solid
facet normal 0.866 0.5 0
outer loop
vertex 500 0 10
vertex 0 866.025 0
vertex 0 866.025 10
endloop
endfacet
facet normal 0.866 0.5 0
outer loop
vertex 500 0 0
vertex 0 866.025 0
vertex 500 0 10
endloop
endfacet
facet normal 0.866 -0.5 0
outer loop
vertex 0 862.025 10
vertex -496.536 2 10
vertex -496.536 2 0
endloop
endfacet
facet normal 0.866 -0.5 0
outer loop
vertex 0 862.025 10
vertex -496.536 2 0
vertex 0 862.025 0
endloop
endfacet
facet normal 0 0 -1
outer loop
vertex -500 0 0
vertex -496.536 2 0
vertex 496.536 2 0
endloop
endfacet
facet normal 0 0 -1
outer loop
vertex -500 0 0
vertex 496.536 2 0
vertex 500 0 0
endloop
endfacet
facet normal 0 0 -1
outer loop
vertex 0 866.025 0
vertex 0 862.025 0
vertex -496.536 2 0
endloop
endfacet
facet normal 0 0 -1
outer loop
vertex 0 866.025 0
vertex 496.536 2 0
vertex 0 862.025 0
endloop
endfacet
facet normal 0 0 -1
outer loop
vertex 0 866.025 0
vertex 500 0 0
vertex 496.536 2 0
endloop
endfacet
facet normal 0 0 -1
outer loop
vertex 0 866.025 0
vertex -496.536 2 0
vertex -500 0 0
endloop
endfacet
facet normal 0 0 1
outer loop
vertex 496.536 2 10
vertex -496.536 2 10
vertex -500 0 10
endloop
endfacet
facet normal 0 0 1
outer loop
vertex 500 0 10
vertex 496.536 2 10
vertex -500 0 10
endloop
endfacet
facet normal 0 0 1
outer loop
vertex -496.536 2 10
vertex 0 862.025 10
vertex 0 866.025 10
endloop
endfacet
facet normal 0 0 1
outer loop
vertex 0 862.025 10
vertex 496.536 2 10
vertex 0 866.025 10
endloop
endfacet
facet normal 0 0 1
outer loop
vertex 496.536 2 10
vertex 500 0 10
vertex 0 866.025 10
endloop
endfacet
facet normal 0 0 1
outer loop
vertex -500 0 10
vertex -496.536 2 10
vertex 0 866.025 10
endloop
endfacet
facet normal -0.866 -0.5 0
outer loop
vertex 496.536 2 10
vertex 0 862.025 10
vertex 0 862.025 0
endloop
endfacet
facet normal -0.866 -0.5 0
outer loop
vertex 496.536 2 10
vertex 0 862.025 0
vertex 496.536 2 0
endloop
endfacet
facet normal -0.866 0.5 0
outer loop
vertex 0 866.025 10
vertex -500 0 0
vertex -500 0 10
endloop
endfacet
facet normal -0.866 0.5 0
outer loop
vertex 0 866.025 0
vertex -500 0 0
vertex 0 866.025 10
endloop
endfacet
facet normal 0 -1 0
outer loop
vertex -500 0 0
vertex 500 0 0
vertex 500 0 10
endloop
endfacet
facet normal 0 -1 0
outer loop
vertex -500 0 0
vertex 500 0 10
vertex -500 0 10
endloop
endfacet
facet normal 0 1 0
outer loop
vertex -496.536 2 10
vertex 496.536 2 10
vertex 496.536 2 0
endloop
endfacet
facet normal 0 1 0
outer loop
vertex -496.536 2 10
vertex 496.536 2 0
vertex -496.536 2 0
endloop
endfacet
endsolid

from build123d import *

# Parameters (mm, degrees)
BOSS_EXTRU_1_DEPTH      = 10
ENL_V_MAT_EXTRU_1_DEPTH = 10


with BuildPart() as part:
    # Esquisse1 → Boss.-Extru.1 (new body)
    with BuildSketch(Plane.XY):
        Polygon((-500, 0), (0, 866.025403784), (500, 0), align=None)
    extrude(amount=BOSS_EXTRU_1_DEPTH)

    # Esquisse2 → Enlèv. mat.-Extru.1 (cut)
    with BuildSketch(Plane.XY.offset(10)):
        Polygon((-496.535898385, 2), (0, 862.025403784), (496.535898385, 2), align=None)
    extrude(amount=-ENL_V_MAT_EXTRU_1_DEPTH, mode=Mode.SUBTRACT)


solid = part.part
